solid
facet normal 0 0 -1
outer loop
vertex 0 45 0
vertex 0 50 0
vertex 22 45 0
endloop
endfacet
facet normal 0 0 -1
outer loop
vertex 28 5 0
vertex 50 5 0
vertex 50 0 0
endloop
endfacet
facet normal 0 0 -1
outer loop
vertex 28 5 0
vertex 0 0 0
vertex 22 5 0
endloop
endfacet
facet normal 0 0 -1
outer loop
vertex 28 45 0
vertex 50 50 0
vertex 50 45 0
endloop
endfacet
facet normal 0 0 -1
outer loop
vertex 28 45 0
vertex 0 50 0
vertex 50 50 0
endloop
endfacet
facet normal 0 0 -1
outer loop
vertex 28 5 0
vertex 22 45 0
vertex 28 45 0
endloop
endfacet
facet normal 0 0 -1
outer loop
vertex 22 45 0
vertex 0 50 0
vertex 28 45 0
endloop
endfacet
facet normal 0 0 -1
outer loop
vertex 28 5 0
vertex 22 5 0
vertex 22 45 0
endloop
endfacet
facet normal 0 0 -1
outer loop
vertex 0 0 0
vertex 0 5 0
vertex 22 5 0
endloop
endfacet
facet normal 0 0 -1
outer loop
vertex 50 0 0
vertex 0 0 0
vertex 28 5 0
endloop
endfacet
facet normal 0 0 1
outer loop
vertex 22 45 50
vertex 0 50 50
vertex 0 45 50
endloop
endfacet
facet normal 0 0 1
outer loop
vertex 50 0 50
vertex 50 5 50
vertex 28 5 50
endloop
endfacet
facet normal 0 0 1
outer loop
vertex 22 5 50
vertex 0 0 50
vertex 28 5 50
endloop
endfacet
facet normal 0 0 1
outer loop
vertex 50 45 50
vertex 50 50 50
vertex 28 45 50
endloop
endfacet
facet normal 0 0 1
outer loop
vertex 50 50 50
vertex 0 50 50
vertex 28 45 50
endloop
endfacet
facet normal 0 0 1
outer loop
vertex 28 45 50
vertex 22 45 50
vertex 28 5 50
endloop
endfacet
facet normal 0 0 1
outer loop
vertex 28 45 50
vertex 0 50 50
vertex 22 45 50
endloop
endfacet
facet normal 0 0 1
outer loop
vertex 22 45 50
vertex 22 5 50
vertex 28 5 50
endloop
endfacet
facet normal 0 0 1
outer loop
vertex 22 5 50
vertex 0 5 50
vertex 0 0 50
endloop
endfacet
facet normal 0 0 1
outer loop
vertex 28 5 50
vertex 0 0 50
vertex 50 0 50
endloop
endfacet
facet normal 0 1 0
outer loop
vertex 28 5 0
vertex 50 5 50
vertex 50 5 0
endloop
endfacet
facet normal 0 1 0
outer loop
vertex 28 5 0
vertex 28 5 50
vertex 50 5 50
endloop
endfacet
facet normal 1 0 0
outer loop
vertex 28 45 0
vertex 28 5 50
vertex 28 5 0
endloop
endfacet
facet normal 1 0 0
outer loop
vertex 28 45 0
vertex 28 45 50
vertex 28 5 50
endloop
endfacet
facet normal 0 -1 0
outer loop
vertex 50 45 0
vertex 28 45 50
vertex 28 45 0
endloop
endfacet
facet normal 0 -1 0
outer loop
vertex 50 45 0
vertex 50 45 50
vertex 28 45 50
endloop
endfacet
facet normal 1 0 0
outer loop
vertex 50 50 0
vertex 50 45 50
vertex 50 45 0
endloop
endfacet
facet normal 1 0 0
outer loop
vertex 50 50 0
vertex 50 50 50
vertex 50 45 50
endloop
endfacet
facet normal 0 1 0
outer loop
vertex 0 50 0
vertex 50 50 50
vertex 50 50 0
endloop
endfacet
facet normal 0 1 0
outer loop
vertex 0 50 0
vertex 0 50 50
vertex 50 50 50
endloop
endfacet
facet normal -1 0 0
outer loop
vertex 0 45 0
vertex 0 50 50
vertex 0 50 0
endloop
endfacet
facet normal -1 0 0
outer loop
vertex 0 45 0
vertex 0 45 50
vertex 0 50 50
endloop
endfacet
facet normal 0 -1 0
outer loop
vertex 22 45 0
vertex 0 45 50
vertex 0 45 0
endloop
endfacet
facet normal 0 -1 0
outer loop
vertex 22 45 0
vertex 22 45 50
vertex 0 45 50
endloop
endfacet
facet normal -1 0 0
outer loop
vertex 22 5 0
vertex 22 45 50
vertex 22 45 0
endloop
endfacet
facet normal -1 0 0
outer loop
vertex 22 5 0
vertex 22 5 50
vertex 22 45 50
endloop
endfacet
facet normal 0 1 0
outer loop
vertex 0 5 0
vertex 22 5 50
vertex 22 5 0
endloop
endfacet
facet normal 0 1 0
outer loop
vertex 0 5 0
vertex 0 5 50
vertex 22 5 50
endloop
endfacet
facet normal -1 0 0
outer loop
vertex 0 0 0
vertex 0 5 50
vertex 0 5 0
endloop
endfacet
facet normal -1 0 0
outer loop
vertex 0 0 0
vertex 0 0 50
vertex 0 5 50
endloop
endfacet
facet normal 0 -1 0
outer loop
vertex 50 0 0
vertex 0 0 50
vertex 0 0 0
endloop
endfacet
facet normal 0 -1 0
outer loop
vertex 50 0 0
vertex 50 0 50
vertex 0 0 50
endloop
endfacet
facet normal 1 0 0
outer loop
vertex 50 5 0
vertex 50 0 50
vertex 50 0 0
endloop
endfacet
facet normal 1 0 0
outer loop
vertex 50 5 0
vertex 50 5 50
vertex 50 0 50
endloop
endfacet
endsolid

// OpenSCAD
$fn = 32;

// ----------------------------------------------------------------------
// Structural section: ibeam 50 x 50 mm
// ----------------------------------------------------------------------

// --- parameters (mm) ---
sec_w = 50;               // section width, X
sec_h = 50;               // section height, Y
flange_t = 5;             // flange thickness
web_t = 6;                // web thickness
plate_t = 50;             // cut length, Z (extrusion height)

profile = [[0, 0], [50, 0], [50, 5], [28, 5], [28, 45], [50, 45], [50, 50], [0, 50], [0, 45], [22, 45], [22, 5], [0, 5]];  // primary outline, 12 points, counter clockwise

// --- the one profile operation ---
linear_extrude(height = plate_t) polygon(points = profile);
